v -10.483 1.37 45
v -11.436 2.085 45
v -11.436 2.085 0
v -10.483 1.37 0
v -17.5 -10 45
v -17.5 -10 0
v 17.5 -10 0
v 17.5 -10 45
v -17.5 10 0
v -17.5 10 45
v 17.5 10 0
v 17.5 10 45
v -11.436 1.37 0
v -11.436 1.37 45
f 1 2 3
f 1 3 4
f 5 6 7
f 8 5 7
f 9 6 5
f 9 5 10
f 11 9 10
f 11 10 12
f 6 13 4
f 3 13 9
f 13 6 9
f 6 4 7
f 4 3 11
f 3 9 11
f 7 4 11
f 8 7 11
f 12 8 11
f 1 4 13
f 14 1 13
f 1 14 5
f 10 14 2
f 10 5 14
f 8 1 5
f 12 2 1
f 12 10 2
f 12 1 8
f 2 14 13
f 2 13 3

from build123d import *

# Parameters (mm, degrees)
F0_W     = 35
F0_H     = 20
F1_DEPTH = 45


with BuildPart() as f1:
    # F0 (on Top) → F1 (new body)
    with BuildSketch(Plane.XY):
        Rectangle(F0_W, F0_H)
        Polygon((-11.43638, 1.369983), (-11.43638, 2.084757), (-10.483347, 1.369983), align=None, mode=Mode.SUBTRACT)
    extrude(amount=F1_DEPTH)


solid = f1.part
